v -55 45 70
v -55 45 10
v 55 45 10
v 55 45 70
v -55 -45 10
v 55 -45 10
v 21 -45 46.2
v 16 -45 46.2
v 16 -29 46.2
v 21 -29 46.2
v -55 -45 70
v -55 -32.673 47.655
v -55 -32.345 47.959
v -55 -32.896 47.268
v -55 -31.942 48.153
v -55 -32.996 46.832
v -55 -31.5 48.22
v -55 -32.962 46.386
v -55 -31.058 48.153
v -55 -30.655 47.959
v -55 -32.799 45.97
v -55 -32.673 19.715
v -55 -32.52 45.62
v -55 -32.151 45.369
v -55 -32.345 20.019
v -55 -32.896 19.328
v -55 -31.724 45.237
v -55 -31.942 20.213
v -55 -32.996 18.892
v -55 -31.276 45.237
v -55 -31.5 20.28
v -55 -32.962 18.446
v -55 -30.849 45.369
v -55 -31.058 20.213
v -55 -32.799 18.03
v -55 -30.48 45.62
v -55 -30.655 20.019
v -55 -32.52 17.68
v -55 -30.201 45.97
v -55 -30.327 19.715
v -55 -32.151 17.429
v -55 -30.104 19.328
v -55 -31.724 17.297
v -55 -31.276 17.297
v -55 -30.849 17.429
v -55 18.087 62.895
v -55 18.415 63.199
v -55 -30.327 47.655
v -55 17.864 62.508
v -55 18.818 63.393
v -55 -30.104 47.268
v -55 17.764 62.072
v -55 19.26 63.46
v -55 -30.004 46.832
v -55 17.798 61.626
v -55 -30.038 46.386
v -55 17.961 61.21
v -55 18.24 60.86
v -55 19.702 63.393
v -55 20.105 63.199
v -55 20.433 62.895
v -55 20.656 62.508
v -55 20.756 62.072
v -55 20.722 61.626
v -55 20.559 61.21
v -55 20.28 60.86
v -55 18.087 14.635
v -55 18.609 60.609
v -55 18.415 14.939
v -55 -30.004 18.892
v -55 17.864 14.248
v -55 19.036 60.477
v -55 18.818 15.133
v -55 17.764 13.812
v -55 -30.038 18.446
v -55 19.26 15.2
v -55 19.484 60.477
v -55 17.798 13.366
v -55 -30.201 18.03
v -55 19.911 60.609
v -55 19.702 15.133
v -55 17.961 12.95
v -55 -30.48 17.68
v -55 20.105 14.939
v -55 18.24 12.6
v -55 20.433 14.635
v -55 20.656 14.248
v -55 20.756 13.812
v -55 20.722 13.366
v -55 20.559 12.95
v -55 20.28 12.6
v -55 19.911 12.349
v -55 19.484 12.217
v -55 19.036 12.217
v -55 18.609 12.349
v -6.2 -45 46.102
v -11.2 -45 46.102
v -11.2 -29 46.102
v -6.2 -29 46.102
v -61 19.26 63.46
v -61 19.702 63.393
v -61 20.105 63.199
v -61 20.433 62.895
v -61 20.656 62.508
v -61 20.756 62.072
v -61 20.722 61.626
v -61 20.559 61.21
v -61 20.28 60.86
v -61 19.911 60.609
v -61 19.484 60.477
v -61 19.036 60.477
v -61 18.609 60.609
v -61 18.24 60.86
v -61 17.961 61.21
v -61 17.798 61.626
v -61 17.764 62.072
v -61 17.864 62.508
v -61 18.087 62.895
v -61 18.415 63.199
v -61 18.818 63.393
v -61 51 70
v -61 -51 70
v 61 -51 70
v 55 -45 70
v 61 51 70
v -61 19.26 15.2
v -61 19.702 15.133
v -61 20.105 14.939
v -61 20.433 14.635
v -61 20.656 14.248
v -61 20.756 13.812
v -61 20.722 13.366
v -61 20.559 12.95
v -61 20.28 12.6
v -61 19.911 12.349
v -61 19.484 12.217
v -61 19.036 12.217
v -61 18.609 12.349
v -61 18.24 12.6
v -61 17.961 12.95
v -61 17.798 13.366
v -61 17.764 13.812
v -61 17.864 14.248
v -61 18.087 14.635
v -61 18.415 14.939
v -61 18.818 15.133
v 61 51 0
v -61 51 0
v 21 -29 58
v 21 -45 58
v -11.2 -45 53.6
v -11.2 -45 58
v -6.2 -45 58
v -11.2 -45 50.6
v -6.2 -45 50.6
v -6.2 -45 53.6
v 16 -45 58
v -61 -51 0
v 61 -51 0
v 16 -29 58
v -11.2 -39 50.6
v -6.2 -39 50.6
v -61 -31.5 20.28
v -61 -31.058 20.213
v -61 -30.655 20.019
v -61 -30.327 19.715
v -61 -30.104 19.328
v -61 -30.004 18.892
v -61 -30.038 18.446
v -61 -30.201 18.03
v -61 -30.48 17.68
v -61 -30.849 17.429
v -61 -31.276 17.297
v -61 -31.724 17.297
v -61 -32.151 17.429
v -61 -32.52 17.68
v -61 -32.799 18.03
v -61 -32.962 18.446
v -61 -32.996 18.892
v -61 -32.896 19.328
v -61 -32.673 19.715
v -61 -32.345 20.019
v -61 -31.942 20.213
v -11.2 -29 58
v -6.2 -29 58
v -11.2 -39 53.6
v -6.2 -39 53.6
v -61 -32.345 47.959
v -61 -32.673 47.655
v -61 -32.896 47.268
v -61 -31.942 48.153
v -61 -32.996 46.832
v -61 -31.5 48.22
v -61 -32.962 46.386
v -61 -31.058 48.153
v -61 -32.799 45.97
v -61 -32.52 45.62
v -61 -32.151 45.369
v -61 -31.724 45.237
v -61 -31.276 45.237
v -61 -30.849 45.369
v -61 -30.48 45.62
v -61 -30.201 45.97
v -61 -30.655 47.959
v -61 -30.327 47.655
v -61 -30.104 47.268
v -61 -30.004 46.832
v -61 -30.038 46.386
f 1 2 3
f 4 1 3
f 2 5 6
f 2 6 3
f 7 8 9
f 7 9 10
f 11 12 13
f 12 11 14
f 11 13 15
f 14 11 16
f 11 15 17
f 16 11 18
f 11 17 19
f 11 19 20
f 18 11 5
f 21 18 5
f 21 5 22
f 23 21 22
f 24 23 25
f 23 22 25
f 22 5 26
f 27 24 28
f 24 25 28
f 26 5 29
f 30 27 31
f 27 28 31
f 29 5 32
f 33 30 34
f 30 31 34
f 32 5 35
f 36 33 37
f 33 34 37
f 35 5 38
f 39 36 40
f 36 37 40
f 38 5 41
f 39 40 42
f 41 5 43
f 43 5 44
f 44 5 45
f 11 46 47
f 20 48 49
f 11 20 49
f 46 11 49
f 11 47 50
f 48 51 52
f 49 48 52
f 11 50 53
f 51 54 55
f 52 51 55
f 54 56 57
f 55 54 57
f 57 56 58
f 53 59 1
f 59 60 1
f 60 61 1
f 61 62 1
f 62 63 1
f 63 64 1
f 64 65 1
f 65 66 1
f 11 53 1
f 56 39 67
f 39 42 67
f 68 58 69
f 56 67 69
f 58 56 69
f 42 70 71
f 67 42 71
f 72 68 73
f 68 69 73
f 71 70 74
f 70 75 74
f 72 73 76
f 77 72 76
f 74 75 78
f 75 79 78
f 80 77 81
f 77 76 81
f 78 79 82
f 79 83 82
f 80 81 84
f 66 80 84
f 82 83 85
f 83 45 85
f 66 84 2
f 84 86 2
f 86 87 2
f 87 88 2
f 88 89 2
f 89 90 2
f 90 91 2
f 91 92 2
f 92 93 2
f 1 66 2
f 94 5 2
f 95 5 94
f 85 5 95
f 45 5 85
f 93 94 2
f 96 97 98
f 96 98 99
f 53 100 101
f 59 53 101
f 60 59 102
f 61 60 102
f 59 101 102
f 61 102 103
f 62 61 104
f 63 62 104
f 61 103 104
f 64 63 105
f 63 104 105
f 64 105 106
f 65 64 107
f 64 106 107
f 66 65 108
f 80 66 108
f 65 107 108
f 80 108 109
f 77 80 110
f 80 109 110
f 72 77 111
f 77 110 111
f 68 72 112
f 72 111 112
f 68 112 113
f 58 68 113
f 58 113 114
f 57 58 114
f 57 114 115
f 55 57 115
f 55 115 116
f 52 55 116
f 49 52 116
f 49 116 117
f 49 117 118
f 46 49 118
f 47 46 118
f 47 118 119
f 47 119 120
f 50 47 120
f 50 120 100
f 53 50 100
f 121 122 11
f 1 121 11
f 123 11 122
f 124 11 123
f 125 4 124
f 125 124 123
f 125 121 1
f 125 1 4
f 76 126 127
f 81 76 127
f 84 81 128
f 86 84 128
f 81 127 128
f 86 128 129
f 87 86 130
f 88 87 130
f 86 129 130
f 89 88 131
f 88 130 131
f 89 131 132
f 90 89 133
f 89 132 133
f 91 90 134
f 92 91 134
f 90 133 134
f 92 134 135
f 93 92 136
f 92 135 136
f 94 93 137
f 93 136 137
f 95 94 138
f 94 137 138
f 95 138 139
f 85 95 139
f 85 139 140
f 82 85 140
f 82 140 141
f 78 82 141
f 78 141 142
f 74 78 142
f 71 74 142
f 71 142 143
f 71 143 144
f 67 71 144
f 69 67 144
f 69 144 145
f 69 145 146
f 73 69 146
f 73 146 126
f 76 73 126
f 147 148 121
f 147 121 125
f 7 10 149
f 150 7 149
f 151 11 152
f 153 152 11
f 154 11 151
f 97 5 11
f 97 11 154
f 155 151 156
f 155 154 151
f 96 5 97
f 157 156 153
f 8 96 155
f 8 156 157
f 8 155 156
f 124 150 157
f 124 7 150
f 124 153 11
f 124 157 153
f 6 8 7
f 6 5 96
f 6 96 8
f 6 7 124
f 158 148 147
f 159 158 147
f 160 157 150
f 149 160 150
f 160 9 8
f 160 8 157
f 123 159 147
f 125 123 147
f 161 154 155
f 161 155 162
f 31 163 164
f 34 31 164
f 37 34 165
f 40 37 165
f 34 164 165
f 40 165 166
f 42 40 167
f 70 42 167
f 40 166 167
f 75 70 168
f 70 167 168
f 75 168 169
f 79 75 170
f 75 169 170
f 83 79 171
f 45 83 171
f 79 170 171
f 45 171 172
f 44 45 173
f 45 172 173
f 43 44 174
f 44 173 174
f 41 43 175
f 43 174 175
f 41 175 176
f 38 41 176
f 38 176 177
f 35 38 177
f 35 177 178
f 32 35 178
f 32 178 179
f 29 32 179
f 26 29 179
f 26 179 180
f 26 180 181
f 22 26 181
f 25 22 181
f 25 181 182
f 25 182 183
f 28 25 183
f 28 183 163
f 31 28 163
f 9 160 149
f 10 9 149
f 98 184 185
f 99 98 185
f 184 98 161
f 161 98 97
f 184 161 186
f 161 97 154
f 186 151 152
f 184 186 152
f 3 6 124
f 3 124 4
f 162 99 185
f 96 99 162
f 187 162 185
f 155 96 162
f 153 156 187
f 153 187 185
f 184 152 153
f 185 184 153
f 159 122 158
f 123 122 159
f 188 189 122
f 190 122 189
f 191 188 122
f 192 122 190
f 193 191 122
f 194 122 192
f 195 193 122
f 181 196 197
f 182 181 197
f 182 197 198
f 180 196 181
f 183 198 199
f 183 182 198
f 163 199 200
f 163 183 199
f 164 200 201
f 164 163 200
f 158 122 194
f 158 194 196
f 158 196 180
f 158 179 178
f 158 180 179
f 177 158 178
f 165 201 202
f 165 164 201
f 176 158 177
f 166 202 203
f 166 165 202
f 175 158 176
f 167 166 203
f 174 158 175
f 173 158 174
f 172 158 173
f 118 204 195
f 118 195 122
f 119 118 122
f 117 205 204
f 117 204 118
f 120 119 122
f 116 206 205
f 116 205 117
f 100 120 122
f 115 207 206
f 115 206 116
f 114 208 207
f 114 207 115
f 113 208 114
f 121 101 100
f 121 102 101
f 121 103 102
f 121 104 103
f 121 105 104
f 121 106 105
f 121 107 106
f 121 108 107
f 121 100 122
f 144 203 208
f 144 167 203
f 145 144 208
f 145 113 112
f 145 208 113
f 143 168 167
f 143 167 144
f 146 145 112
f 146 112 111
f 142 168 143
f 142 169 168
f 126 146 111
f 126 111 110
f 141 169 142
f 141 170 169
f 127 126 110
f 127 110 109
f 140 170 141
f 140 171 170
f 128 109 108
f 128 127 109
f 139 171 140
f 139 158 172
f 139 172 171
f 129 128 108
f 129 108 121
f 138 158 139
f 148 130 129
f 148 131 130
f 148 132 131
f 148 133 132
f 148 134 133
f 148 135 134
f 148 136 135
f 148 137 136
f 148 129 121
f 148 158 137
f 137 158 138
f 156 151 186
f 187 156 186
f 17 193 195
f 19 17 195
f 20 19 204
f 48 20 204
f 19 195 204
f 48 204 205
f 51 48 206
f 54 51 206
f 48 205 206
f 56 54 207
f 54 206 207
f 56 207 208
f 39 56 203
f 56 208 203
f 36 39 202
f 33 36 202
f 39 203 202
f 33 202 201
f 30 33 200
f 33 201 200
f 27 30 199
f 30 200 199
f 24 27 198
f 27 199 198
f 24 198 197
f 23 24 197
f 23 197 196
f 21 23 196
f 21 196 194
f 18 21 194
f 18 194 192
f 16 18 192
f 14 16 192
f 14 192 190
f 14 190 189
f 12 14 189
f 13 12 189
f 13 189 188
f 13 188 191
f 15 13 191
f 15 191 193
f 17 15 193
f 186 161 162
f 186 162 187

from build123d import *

# Parameters (mm, degrees)
SKETCH1_W           = 122
SKETCH1_H           = 102
SKETCH1_W_2         = 110
SKETCH1_H_2         = 90
BOSS_EXTRUDE1_DEPTH = 70
SKETCH3_W           = 10
SKETCH3_H           = 102
BOSS_EXTRUDE3_DEPTH = 122
SKETCH6_R           = 1.5
CUT_EXTRUDE1_DEPTH  = 10
SKETCH5_R           = 1.5
CUT_EXTRUDE2_DEPTH  = 10
SKETCH5_3_R         = 1.5
CUT_EXTRUDE3_DEPTH  = 10
SKETCH8_W           = 5
SKETCH8_H           = 11.8
SKETCH8_H_2         = 11.897582895
BOSS_EXTRUDE4_DEPTH = 22
SKETCH14_W          = 3
SKETCH14_H          = 6
CUT_EXTRUDE6_DEPTH  = 10


with BuildPart() as part:
    # Sketch1 → Boss-Extrude1 (new body)
    with BuildSketch(Plane.XY):
        Rectangle(SKETCH1_W, SKETCH1_H)
        Rectangle(SKETCH1_W_2, SKETCH1_H_2, mode=Mode.SUBTRACT)
    extrude(amount=BOSS_EXTRUDE1_DEPTH)

    # Sketch3 → Boss-Extrude3 (add)
    with BuildSketch(Plane(origin=(61, 0, 0), x_dir=(0, 0, -1), z_dir=(1, 0, 0))):
        with Locations((-5, 0)):
            Rectangle(SKETCH3_W, SKETCH3_H)
    extrude(amount=-BOSS_EXTRUDE3_DEPTH)

    # Sketch6 → Cut-Extrude1 (cut)
    with BuildSketch(Plane.ZY.offset(61)):
        with Locations((18.78, -31.5)):
            Circle(SKETCH6_R)
        with Locations((46.72, -31.5)):
            Circle(SKETCH6_R)
    extrude(amount=-CUT_EXTRUDE1_DEPTH, mode=Mode.SUBTRACT)

    # Sketch5 → Cut-Extrude2 (cut)
    with BuildSketch(Plane.ZY.offset(61)):
        with Locations((61.96, 19.26)):
            Circle(SKETCH5_R)
    extrude(amount=-CUT_EXTRUDE2_DEPTH, mode=Mode.SUBTRACT)

    # Sketch5<3> → Cut-Extrude3 (cut)
    with BuildSketch(Plane.ZY.offset(61)):
        with Locations((13.7, 19.26)):
            Circle(SKETCH5_3_R)
    extrude(amount=-CUT_EXTRUDE3_DEPTH, mode=Mode.SUBTRACT)

    # Sketch8 → Boss-Extrude4 (add)
    with BuildSketch(Plane.XZ.offset(51)):
        with Locations((18.5, 52.1)):
            Rectangle(SKETCH8_W, SKETCH8_H)
        with Locations((-8.7, 52.051208553)):
            Rectangle(SKETCH8_W, SKETCH8_H_2)
    extrude(amount=-BOSS_EXTRUDE4_DEPTH)

    # Sketch14 → Cut-Extrude6 (cut)
    with BuildSketch(Plane.ZY.offset(11.2)):
        with Locations((52.1, -42)):
            Rectangle(SKETCH14_W, SKETCH14_H)
    extrude(amount=-CUT_EXTRUDE6_DEPTH, mode=Mode.SUBTRACT)


solid = part.part
